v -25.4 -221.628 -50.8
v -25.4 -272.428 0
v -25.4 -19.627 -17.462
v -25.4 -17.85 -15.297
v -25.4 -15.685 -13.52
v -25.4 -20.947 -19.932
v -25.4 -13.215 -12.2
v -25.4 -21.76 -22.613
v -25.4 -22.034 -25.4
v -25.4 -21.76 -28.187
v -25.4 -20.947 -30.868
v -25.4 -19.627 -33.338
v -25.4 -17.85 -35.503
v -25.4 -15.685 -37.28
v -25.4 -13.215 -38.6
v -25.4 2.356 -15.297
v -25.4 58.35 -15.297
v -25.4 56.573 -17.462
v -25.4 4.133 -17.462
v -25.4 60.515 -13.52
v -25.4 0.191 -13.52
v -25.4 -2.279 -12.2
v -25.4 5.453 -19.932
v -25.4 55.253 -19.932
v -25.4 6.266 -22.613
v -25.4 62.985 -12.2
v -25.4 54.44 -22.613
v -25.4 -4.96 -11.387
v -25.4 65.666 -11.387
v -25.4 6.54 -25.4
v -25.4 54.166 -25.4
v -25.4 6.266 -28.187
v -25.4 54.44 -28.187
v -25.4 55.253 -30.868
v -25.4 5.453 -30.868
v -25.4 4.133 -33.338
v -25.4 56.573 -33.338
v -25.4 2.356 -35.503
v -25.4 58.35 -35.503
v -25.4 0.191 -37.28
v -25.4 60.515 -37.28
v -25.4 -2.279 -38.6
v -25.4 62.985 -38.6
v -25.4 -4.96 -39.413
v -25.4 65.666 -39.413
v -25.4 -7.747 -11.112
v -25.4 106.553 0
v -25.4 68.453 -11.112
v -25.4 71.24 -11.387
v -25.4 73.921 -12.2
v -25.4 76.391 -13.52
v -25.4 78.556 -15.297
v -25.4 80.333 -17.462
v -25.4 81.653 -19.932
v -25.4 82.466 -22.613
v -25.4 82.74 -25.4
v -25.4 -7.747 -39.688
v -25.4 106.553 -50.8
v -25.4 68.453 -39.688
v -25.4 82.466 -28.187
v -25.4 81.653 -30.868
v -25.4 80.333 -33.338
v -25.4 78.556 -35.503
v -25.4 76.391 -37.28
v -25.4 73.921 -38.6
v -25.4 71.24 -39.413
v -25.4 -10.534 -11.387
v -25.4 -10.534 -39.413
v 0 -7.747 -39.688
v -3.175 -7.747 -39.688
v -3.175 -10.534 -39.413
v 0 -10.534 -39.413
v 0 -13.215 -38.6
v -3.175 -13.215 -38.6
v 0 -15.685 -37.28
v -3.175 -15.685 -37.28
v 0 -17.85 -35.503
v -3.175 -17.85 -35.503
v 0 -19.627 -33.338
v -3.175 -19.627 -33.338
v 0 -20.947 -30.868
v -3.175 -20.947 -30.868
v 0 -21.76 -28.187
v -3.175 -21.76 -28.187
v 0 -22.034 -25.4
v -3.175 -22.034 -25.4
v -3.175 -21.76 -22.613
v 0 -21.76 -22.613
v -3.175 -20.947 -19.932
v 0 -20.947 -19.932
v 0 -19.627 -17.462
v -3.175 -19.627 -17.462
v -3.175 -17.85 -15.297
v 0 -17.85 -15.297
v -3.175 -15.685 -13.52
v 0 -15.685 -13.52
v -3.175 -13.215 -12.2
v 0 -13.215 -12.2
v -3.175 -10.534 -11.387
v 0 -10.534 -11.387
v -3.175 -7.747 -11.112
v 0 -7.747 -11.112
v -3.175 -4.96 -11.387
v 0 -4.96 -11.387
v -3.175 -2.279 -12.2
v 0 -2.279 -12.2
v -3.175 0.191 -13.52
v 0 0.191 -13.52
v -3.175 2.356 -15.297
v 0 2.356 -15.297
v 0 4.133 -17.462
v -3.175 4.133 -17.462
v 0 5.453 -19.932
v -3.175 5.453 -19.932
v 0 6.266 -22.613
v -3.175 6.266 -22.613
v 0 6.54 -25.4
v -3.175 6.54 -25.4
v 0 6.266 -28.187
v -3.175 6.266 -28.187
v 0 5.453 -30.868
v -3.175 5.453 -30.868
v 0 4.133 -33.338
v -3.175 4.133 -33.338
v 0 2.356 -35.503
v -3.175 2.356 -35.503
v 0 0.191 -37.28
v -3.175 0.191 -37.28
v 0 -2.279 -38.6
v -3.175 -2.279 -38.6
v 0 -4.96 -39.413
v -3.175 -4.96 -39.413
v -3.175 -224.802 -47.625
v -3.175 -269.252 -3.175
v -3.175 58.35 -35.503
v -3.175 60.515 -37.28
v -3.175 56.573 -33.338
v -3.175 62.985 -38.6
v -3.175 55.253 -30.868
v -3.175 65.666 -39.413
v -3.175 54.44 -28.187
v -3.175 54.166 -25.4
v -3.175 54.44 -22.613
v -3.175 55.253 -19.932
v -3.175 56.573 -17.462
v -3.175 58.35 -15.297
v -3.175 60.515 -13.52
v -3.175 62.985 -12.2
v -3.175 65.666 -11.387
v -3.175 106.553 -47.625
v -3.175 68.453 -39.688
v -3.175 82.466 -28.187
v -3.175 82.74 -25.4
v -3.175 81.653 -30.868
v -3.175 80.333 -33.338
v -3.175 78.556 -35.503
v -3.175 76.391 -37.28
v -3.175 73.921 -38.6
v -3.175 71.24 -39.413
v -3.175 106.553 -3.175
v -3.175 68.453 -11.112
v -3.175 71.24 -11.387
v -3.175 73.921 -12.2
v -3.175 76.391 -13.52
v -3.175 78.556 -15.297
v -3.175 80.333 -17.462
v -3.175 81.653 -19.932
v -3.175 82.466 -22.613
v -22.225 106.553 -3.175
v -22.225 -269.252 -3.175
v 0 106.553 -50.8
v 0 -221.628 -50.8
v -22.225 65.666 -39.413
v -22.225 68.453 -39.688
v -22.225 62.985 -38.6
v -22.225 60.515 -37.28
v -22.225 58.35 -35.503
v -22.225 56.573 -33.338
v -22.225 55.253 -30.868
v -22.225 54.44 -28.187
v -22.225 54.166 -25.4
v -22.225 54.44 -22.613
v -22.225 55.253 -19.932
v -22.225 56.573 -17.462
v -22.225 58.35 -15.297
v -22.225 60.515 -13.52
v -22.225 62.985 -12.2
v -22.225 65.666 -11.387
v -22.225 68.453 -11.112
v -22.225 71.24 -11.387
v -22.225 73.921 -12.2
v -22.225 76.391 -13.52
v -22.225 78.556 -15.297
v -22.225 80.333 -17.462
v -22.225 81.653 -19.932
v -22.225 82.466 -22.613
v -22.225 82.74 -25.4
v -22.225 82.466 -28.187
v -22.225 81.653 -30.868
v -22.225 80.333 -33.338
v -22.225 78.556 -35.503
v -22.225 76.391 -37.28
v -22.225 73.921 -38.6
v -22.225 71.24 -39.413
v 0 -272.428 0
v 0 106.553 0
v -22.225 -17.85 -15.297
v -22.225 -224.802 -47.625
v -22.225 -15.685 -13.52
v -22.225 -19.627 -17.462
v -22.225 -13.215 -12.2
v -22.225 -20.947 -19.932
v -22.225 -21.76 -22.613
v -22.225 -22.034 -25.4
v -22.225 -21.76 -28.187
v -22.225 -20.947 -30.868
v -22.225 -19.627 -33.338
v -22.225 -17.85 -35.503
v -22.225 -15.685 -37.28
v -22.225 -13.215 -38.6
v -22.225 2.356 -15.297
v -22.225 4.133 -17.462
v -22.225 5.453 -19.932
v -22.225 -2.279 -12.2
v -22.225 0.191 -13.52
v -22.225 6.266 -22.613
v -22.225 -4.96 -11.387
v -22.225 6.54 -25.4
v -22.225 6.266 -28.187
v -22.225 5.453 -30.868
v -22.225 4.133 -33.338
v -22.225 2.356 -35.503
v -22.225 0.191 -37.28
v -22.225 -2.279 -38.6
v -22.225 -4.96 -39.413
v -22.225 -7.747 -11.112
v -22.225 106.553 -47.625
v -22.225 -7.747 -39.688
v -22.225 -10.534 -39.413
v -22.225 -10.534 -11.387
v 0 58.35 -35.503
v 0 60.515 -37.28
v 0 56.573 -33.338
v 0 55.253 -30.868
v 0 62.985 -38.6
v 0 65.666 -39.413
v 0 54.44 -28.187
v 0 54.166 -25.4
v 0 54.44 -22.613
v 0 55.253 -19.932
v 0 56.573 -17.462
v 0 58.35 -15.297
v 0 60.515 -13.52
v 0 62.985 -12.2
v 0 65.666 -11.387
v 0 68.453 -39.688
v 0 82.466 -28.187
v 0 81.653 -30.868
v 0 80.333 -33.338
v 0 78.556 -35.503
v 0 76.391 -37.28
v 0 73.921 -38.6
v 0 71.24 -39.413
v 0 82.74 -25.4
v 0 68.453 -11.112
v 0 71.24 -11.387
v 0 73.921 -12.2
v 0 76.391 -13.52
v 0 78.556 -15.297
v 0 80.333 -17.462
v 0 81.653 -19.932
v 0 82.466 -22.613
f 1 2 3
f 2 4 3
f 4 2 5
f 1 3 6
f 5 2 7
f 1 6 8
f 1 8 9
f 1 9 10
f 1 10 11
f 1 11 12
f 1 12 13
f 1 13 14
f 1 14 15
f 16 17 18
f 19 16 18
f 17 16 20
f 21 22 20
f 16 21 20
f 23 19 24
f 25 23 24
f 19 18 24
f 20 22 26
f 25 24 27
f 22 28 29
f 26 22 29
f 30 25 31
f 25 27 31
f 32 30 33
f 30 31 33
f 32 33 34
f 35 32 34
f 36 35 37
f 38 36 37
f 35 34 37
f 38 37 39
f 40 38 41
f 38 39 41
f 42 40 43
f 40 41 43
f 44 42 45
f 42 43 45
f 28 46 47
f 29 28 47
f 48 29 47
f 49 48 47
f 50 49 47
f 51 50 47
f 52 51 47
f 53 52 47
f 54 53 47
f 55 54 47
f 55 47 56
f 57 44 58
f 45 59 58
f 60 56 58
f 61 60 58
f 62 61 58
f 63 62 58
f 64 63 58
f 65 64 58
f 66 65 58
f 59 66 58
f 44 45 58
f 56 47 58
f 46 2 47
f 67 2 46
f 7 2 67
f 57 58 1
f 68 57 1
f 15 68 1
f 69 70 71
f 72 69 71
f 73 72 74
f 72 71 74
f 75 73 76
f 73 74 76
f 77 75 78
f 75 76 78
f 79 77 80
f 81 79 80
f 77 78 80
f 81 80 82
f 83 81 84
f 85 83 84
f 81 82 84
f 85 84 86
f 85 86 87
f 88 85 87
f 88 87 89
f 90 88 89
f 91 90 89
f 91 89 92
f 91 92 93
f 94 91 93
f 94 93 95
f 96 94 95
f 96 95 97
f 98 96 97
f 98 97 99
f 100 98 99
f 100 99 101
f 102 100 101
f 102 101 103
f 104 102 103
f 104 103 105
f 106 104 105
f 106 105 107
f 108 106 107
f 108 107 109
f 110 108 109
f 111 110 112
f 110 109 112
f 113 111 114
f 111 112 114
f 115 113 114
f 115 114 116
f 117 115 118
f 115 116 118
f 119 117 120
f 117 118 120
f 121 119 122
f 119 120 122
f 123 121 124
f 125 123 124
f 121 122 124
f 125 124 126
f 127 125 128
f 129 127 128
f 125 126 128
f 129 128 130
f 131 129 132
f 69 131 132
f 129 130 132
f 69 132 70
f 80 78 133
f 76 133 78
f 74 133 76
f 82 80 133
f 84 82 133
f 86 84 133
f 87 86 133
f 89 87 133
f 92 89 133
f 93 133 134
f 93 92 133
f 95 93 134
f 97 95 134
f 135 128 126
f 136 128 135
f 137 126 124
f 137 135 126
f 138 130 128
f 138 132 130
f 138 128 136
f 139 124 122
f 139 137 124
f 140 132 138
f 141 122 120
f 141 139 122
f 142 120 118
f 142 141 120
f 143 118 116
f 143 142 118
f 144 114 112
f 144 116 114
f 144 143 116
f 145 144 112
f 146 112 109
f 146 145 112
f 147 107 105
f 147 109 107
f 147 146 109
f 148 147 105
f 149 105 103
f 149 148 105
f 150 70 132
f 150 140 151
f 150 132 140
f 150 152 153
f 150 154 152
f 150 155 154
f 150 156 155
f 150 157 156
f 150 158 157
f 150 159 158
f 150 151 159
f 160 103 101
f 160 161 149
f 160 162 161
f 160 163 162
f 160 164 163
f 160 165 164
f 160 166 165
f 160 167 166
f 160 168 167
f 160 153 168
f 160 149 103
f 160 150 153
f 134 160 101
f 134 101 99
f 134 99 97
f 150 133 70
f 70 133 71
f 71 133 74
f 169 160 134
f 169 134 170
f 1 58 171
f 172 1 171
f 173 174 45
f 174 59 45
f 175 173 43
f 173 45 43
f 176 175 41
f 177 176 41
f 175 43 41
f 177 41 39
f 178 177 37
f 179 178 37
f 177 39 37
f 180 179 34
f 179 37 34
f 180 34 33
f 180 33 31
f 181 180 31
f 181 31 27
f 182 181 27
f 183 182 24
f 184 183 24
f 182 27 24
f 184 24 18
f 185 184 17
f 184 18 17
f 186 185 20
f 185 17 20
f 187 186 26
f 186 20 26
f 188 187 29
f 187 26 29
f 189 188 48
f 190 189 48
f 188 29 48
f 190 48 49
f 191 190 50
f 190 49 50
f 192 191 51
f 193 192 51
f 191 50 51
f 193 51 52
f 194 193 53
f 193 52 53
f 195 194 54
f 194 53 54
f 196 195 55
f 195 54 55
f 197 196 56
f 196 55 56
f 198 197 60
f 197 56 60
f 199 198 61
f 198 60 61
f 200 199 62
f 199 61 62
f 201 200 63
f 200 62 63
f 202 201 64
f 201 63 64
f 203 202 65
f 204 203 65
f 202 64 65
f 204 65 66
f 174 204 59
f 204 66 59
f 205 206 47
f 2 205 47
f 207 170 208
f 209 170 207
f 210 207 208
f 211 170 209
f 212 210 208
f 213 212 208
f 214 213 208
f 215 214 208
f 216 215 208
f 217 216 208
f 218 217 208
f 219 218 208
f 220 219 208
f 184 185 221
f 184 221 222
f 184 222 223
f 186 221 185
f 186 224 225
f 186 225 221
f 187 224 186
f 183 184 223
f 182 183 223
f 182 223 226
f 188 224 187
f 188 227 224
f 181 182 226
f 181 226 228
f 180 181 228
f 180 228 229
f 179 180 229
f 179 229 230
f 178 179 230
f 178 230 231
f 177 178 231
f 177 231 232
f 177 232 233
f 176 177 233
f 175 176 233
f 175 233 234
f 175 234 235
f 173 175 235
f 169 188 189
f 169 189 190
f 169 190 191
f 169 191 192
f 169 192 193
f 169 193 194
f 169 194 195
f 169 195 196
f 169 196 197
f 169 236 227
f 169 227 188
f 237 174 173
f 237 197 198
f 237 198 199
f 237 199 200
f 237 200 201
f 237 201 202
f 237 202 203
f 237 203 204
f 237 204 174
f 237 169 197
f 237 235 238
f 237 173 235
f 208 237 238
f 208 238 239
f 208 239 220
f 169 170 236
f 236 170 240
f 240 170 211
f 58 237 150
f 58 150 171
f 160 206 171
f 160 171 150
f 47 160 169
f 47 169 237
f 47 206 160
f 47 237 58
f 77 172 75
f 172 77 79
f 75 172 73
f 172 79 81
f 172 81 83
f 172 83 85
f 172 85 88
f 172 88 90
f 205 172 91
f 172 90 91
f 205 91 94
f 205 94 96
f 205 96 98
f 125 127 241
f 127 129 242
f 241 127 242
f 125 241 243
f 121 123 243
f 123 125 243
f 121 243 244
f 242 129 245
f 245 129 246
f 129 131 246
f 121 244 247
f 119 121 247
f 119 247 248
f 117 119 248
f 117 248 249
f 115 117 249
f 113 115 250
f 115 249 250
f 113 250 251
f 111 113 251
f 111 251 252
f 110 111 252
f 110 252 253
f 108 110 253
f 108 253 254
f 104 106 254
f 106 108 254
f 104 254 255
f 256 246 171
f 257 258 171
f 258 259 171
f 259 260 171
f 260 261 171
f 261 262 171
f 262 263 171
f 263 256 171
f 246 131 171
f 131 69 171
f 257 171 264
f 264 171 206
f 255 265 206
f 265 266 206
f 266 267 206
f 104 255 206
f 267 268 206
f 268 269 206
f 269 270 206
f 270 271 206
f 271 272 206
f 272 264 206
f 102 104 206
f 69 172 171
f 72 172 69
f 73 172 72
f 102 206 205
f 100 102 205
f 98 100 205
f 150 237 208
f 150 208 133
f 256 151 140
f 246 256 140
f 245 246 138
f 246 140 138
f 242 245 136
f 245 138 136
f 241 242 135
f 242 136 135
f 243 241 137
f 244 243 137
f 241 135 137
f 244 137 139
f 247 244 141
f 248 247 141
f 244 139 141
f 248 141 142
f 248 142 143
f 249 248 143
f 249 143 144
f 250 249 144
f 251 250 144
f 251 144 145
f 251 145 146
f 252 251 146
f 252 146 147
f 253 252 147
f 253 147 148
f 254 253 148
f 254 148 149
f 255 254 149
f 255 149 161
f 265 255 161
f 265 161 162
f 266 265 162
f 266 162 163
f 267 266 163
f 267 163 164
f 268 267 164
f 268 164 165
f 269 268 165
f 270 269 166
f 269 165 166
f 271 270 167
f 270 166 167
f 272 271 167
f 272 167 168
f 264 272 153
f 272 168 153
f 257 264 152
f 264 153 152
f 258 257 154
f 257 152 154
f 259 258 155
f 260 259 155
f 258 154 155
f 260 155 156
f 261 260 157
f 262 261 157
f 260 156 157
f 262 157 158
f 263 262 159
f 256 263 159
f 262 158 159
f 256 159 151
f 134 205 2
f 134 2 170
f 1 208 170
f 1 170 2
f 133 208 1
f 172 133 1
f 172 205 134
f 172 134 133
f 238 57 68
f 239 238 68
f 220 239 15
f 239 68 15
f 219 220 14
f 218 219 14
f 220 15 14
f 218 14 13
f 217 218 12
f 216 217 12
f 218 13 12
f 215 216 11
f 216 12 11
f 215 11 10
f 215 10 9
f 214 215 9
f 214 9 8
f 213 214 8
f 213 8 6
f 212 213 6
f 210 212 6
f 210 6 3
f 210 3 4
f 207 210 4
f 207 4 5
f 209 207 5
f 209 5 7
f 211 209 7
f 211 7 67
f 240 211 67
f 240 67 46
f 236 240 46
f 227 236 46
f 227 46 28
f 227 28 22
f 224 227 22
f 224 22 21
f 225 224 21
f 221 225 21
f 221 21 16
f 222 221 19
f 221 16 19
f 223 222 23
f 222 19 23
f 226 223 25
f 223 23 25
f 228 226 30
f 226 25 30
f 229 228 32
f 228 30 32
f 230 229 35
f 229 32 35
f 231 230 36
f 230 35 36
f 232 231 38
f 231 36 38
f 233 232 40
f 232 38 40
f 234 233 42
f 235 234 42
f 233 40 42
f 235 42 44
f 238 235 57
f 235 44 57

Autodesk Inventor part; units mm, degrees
ref_plane "YZ Plane" through (0, 0, 0) normal (1, 0, 0) x (0, 1, 0)
ref_plane "XZ Plane" through (0, 0, 0) normal (0, 1, 0) x (-1, 0, 0)
ref_plane "XY Plane" through (0, 0, 0) normal (0, 0, 1) x (1, 0, 0)
sketch "Sketch1" plane through (0, 0, 0) normal (0, 1, 0) x (-1, 0, 0)
  line L0 (0, 0) -> (25.4, 0)
  line L1 (25.4, 0) -> (25.4, -50.8)
  line L2 (25.4, -50.8) -> (0, -50.8)
  line L3 (0, -50.8) -> (0, 0)
  line L4 (22.225, -3.175) -> (3.175, -3.175)
  line L5 (3.175, -3.175) -> (3.175, -47.625)
  line L6 (3.175, -47.625) -> (22.225, -47.625)
  line L7 (22.225, -47.625) -> (22.225, -3.175)
  dimension "d0" = 25.4
  dimension "d1" = 50.8
  dimension "d2" = 3.175
extrude "Extrusion1" add sketch "Sketch1" along normal blind 106.553
sketch "Sketch3" plane through (0, 0, 0) normal (1, 0, 0) x (0, 0, -1)
  line L0 (50.8, 0) -> (0, 0) projected
  line L1 (50.8, 0) -> (50.8, 106.553) projected
  line L2 (0, 106.553) -> (50.8, 106.553) projected
  line L3 (0, 0) -> (0, 106.553) projected
  point P0 (25.4, 68.453)
  dimension "d19" = 38.1
hole "Hole2" at (0, 68.453, -25.4) direction (-1, 0, 0) diameter 28.575 end through all
sketch "Sketch4" plane through (0, 0, 0) normal (0, -1, 0) x (1, 0, 0)
  line L0 (-22.225, -47.625) -> (-22.225, -3.175) projected
  line L1 (-22.225, -3.175) -> (-3.175, -3.175) projected
  line L2 (-3.175, -3.175) -> (-3.175, -47.625) projected
  line L3 (-3.175, -47.625) -> (-22.225, -47.625) projected
  line L4 (0, 0) -> (-25.4, 0) projected
  line L5 (-25.4, 0) -> (-25.4, -50.8) projected
  line L6 (-25.4, -50.8) -> (0, -50.8) projected
  line L7 (0, -50.8) -> (0, 0) projected
extrude "Extrusion2" add sketch "Sketch4" along normal blind 254
sketch "Sketch5" plane through (0, 106.553, 0) normal (1, 0, 0) x (0, 0, -1)
  circle A0 centre (25.4, -38.1) radius 14.2875 projected
  line L0 (50.8, 0) -> (50.8, -360.553) projected
  line L1 (0, 0) -> (50.8, 0) projected
  line L2 (0, -360.553) -> (0, 0) projected
  line L3 (50.8, -360.553) -> (0, -360.553) projected
  line L4 (0, -360.553) -> (23.3209, -360.553)
  line L5 (0, -360.553) -> (50.8, -360.553) projected
  line L6 (0, -360.553) -> (9.2137, -369.7667)
  line L7 (0, -360.553) -> (9.2137, -360.553)
  line L8 (9.2137, -360.553) -> (9.2137, -369.7667)
  line L9 (9.2137, -369.7667) -> (0, -369.7667)
  line L10 (0, -369.7667) -> (0, -360.553)
  line L11 (0, -369.7667) -> (0, -378.9805)
  line L12 (0, -378.9805) -> (50.8, -328.1805)
  line L13 (50.8, 0) -> (50.8, -360.553) projected
  line L14 (50.8, -328.1805) -> (0, -328.1805)
  line L15 (0, -328.1805) -> (0, -378.9805)
  line L16 (0, -378.9805) -> (50.8, -378.9805)
  line L17 (50.8, -378.9805) -> (50.8, -328.1805)
  point P0 (0, -106.553)
  dimension "d22" = 13.0302
  dimension "d23" = 45
  dimension "d24" = 45
extrude "Extrusion3" add sketch "Sketch5" against normal blind 25.4 contours L12 L3 L2 L14 | L12 L8 L3 | L8 L6 L3 | L9 L10 L6 | L12 L11 L9
extrude "Extrusion4" cut sketch "Sketch5" against normal blind 25.4 contours L0 L3 L12 | L17 L16 L12 L3
sketch "Sketch6" plane through (0, 106.553, 0) normal (0, 1, 0) x (1, 0, 0)
  line L0 (-22.225, 3.175) -> (-22.225, 47.625) projected
  line L1 (-3.175, 3.175) -> (-22.225, 3.175) projected
  line L2 (-3.175, 47.625) -> (-3.175, 3.175) projected
  line L3 (-22.225, 47.625) -> (-3.175, 47.625) projected
  point P0 (0, 0)
extrude "Extrusion5" cut sketch "Sketch6" against normal through all
sketch "Sketch7" plane through (0, 106.553, 0) normal (1, 0, 0) x (0, 0, -1)
  line L0 (0, -378.9805) -> (50.8, -328.1805) projected
  line L1 (50.8, 0) -> (50.8, -328.1805) projected
  line L2 (0, 0) -> (50.8, 0) projected
  line L3 (0, -378.9805) -> (0, 0) projected
  circle A0 centre (25.4, -38.1) radius 14.2875 projected
  point P0 (0, -106.553)
  point P1 (25.4, -114.3)
  dimension "d31" = 76.2
hole "Hole3" at (0, -7.747, -25.4) direction (-1, 0, 0) diameter 28.575 end through all
properties part number "StorageSupport.ver1-1111-2020" material "Aluminum 6061"
